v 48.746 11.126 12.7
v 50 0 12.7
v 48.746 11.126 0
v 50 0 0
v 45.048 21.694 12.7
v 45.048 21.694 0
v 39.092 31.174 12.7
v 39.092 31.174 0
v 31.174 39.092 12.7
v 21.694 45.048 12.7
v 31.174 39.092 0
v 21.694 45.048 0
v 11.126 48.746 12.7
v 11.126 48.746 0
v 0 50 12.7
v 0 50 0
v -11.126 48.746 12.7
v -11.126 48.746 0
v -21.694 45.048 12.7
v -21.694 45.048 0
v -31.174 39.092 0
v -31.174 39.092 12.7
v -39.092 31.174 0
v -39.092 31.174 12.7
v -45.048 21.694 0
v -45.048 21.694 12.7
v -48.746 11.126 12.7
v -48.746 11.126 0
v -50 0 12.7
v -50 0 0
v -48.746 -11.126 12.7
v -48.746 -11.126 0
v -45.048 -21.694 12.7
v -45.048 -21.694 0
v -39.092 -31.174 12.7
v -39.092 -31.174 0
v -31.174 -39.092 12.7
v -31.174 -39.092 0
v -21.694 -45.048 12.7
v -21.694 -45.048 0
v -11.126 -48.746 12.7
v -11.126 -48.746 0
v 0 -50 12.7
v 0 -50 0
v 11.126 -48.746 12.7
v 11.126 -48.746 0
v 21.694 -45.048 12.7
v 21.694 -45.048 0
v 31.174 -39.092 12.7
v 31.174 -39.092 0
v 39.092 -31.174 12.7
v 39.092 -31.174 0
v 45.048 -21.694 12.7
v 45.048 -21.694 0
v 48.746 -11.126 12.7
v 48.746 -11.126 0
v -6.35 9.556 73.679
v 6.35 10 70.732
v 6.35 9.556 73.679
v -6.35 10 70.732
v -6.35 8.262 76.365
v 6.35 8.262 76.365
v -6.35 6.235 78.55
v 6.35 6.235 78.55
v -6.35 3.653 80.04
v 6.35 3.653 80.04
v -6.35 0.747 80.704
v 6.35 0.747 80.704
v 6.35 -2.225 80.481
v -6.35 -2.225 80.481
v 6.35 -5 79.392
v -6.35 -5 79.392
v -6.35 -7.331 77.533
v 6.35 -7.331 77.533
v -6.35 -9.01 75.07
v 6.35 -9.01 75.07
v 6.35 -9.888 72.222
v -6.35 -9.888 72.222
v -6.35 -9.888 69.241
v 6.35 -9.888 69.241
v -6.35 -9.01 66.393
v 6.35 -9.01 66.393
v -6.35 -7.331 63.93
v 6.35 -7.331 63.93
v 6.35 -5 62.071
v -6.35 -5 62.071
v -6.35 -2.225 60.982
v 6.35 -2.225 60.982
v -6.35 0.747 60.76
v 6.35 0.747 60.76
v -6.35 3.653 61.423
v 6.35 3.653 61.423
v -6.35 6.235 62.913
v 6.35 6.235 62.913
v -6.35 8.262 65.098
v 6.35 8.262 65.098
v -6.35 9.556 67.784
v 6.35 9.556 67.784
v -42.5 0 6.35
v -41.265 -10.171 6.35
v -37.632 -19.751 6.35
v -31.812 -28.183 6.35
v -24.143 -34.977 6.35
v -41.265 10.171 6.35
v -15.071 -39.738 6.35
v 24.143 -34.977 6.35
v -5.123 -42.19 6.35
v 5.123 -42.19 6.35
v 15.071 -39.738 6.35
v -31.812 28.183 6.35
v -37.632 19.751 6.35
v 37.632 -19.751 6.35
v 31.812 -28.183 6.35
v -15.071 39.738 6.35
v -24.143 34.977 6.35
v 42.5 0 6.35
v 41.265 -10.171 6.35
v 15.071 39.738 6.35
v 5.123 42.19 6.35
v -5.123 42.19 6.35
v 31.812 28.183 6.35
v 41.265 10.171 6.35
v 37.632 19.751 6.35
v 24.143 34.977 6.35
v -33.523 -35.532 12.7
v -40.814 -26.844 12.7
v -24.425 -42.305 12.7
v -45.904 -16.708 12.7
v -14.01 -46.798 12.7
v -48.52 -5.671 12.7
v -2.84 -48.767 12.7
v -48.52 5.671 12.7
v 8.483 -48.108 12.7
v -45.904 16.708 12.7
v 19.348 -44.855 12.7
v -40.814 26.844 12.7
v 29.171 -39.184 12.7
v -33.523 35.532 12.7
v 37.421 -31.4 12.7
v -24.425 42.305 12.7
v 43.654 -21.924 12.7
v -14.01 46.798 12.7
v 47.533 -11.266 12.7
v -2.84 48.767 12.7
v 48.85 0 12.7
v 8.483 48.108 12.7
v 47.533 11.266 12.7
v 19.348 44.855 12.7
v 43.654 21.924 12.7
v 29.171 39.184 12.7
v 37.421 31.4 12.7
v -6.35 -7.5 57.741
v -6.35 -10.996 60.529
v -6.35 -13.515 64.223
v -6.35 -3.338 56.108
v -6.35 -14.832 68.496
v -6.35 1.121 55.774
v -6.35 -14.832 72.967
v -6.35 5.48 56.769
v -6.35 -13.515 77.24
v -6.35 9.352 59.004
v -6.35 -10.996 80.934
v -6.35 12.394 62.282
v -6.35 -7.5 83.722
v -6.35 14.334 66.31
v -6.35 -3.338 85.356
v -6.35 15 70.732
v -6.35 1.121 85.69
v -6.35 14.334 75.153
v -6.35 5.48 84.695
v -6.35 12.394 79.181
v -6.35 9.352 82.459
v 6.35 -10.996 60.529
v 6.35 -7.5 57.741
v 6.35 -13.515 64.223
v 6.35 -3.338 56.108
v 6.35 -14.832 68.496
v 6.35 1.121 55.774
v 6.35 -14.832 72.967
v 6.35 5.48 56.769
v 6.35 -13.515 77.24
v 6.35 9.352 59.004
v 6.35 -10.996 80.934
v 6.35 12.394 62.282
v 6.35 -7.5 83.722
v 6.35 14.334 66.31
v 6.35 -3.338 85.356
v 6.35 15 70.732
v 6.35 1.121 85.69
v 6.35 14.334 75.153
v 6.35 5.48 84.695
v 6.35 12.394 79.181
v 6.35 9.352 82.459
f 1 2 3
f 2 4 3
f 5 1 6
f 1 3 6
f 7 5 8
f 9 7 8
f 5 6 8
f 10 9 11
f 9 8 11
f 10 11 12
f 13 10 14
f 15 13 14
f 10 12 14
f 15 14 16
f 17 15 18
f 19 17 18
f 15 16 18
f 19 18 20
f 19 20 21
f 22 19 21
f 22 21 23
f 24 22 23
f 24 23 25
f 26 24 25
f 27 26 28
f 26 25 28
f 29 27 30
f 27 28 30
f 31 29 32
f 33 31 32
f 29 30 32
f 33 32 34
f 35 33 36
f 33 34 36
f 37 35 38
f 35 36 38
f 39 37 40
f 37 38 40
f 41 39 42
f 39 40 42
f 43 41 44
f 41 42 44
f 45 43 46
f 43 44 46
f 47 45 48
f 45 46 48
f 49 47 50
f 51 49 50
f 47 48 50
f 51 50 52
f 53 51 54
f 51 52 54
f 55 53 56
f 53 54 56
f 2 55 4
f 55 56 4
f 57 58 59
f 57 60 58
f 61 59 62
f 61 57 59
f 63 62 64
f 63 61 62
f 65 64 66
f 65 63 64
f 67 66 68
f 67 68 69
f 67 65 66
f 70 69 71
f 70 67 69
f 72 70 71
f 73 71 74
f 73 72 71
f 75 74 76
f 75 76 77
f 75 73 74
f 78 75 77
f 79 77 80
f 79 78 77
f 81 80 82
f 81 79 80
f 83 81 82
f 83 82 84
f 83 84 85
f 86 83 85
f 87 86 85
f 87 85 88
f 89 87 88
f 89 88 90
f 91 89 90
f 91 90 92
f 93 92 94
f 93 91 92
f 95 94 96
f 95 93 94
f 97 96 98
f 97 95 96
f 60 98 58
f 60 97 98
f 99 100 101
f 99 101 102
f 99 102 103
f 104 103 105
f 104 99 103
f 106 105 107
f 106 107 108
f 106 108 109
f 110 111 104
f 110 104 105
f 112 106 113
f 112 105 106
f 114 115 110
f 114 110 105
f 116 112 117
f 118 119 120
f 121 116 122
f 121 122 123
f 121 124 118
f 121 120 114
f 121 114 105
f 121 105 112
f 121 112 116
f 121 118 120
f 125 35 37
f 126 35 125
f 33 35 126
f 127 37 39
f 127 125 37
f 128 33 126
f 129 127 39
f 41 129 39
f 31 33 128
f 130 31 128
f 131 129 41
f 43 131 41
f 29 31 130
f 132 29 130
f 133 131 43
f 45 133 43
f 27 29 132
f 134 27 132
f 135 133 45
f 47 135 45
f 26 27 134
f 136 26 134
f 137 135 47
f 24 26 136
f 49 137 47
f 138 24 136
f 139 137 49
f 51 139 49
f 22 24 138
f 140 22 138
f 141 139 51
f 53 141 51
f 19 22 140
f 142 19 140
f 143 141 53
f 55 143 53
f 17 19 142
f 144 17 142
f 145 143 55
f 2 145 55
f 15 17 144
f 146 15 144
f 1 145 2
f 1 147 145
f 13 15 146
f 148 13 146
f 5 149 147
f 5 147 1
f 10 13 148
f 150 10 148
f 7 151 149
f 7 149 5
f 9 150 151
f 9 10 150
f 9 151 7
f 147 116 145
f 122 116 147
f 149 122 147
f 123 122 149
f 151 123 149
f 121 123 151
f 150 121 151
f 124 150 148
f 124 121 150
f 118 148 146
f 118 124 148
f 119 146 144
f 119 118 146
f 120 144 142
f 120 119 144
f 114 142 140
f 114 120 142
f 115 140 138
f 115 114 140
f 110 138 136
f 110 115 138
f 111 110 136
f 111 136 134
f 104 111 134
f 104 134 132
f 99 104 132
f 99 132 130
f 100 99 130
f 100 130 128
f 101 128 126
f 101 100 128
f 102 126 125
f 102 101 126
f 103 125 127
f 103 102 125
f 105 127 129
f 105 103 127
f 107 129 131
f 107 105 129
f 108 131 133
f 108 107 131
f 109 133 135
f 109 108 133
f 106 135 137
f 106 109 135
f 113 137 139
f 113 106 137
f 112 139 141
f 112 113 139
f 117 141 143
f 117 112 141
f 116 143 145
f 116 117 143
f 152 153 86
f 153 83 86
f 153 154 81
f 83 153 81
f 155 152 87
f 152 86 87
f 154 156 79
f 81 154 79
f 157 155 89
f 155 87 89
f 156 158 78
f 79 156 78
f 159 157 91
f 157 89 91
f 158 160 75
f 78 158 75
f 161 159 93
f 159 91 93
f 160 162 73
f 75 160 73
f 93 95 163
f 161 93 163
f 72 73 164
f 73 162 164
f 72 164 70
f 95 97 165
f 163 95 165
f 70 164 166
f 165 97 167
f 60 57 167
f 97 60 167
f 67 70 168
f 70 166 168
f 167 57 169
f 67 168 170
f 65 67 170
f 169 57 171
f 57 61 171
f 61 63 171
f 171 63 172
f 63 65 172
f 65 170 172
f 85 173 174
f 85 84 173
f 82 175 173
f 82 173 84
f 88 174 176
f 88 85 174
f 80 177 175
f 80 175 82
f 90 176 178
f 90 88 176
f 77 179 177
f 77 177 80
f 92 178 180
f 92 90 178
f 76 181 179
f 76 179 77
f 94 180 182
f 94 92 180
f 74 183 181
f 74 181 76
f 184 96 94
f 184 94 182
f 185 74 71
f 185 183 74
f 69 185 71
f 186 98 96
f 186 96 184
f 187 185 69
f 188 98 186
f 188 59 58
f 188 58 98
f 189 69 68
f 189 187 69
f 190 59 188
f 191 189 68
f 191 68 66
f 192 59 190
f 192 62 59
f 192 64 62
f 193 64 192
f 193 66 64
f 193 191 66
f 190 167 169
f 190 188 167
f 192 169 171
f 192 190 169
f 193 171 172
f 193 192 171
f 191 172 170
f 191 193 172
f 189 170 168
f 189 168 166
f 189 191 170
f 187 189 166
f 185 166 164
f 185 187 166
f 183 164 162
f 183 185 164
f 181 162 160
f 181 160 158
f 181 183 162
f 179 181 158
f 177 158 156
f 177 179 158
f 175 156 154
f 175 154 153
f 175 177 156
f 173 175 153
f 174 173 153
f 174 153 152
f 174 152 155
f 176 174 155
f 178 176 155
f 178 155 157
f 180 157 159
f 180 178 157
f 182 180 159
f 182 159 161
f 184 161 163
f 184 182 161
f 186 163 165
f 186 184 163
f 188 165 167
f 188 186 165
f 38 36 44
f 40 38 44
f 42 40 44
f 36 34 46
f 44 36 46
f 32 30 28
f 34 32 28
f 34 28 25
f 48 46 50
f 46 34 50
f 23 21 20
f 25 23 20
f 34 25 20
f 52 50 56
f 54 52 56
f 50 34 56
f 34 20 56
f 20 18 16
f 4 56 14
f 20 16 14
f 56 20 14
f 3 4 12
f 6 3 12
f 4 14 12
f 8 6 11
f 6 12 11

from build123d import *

# Parameters (mm, degrees)
F0_R     = 50
F1_DEPTH = 6.35
F2_R     = 50
F2_R_2   = 42.5
F3_DEPTH = 6.35
F4_SIZE  = 6.34999
F5_R     = 15
F5_R_2   = 10
F6_DEPTH = 6.35


# Not quite as in the source:
# - a fillet or chamfer is up to 0.001 mm smaller than in the source, because OpenCascade refuses the exact size


with BuildPart() as f1:
    # F0 (on Top) → F1 (new body)
    with BuildSketch(Plane.XY):
        Circle(F0_R)
    extrude(amount=F1_DEPTH)

    # F2 (on face) → F3 (join)
    with BuildSketch(Plane.XY.offset(6.35)):
        Circle(F2_R)
        Circle(F2_R_2, mode=Mode.SUBTRACT)
    extrude(amount=F3_DEPTH)

    # F4 (size 6.35 in the source; OpenCascade refuses exactly that, so slightly less here)
    f4_edges = [f1.edges().sort_by_distance(p)[0] for p in [
        (-42.5, 0, 12.7),
    ]]
    chamfer(f4_edges, length=F4_SIZE)


with BuildPart() as f6:
    # F5 (on Right) → F6 (new body, symmetric)
    with BuildSketch(Plane.YZ):
        with Locations((0, 70.7316364521)):
            Circle(F5_R)
        with Locations((0, 70.7316364521)):
            Circle(F5_R_2, mode=Mode.SUBTRACT)
    extrude(amount=F6_DEPTH, both=True)


solid = Compound([f1.part, f6.part])
